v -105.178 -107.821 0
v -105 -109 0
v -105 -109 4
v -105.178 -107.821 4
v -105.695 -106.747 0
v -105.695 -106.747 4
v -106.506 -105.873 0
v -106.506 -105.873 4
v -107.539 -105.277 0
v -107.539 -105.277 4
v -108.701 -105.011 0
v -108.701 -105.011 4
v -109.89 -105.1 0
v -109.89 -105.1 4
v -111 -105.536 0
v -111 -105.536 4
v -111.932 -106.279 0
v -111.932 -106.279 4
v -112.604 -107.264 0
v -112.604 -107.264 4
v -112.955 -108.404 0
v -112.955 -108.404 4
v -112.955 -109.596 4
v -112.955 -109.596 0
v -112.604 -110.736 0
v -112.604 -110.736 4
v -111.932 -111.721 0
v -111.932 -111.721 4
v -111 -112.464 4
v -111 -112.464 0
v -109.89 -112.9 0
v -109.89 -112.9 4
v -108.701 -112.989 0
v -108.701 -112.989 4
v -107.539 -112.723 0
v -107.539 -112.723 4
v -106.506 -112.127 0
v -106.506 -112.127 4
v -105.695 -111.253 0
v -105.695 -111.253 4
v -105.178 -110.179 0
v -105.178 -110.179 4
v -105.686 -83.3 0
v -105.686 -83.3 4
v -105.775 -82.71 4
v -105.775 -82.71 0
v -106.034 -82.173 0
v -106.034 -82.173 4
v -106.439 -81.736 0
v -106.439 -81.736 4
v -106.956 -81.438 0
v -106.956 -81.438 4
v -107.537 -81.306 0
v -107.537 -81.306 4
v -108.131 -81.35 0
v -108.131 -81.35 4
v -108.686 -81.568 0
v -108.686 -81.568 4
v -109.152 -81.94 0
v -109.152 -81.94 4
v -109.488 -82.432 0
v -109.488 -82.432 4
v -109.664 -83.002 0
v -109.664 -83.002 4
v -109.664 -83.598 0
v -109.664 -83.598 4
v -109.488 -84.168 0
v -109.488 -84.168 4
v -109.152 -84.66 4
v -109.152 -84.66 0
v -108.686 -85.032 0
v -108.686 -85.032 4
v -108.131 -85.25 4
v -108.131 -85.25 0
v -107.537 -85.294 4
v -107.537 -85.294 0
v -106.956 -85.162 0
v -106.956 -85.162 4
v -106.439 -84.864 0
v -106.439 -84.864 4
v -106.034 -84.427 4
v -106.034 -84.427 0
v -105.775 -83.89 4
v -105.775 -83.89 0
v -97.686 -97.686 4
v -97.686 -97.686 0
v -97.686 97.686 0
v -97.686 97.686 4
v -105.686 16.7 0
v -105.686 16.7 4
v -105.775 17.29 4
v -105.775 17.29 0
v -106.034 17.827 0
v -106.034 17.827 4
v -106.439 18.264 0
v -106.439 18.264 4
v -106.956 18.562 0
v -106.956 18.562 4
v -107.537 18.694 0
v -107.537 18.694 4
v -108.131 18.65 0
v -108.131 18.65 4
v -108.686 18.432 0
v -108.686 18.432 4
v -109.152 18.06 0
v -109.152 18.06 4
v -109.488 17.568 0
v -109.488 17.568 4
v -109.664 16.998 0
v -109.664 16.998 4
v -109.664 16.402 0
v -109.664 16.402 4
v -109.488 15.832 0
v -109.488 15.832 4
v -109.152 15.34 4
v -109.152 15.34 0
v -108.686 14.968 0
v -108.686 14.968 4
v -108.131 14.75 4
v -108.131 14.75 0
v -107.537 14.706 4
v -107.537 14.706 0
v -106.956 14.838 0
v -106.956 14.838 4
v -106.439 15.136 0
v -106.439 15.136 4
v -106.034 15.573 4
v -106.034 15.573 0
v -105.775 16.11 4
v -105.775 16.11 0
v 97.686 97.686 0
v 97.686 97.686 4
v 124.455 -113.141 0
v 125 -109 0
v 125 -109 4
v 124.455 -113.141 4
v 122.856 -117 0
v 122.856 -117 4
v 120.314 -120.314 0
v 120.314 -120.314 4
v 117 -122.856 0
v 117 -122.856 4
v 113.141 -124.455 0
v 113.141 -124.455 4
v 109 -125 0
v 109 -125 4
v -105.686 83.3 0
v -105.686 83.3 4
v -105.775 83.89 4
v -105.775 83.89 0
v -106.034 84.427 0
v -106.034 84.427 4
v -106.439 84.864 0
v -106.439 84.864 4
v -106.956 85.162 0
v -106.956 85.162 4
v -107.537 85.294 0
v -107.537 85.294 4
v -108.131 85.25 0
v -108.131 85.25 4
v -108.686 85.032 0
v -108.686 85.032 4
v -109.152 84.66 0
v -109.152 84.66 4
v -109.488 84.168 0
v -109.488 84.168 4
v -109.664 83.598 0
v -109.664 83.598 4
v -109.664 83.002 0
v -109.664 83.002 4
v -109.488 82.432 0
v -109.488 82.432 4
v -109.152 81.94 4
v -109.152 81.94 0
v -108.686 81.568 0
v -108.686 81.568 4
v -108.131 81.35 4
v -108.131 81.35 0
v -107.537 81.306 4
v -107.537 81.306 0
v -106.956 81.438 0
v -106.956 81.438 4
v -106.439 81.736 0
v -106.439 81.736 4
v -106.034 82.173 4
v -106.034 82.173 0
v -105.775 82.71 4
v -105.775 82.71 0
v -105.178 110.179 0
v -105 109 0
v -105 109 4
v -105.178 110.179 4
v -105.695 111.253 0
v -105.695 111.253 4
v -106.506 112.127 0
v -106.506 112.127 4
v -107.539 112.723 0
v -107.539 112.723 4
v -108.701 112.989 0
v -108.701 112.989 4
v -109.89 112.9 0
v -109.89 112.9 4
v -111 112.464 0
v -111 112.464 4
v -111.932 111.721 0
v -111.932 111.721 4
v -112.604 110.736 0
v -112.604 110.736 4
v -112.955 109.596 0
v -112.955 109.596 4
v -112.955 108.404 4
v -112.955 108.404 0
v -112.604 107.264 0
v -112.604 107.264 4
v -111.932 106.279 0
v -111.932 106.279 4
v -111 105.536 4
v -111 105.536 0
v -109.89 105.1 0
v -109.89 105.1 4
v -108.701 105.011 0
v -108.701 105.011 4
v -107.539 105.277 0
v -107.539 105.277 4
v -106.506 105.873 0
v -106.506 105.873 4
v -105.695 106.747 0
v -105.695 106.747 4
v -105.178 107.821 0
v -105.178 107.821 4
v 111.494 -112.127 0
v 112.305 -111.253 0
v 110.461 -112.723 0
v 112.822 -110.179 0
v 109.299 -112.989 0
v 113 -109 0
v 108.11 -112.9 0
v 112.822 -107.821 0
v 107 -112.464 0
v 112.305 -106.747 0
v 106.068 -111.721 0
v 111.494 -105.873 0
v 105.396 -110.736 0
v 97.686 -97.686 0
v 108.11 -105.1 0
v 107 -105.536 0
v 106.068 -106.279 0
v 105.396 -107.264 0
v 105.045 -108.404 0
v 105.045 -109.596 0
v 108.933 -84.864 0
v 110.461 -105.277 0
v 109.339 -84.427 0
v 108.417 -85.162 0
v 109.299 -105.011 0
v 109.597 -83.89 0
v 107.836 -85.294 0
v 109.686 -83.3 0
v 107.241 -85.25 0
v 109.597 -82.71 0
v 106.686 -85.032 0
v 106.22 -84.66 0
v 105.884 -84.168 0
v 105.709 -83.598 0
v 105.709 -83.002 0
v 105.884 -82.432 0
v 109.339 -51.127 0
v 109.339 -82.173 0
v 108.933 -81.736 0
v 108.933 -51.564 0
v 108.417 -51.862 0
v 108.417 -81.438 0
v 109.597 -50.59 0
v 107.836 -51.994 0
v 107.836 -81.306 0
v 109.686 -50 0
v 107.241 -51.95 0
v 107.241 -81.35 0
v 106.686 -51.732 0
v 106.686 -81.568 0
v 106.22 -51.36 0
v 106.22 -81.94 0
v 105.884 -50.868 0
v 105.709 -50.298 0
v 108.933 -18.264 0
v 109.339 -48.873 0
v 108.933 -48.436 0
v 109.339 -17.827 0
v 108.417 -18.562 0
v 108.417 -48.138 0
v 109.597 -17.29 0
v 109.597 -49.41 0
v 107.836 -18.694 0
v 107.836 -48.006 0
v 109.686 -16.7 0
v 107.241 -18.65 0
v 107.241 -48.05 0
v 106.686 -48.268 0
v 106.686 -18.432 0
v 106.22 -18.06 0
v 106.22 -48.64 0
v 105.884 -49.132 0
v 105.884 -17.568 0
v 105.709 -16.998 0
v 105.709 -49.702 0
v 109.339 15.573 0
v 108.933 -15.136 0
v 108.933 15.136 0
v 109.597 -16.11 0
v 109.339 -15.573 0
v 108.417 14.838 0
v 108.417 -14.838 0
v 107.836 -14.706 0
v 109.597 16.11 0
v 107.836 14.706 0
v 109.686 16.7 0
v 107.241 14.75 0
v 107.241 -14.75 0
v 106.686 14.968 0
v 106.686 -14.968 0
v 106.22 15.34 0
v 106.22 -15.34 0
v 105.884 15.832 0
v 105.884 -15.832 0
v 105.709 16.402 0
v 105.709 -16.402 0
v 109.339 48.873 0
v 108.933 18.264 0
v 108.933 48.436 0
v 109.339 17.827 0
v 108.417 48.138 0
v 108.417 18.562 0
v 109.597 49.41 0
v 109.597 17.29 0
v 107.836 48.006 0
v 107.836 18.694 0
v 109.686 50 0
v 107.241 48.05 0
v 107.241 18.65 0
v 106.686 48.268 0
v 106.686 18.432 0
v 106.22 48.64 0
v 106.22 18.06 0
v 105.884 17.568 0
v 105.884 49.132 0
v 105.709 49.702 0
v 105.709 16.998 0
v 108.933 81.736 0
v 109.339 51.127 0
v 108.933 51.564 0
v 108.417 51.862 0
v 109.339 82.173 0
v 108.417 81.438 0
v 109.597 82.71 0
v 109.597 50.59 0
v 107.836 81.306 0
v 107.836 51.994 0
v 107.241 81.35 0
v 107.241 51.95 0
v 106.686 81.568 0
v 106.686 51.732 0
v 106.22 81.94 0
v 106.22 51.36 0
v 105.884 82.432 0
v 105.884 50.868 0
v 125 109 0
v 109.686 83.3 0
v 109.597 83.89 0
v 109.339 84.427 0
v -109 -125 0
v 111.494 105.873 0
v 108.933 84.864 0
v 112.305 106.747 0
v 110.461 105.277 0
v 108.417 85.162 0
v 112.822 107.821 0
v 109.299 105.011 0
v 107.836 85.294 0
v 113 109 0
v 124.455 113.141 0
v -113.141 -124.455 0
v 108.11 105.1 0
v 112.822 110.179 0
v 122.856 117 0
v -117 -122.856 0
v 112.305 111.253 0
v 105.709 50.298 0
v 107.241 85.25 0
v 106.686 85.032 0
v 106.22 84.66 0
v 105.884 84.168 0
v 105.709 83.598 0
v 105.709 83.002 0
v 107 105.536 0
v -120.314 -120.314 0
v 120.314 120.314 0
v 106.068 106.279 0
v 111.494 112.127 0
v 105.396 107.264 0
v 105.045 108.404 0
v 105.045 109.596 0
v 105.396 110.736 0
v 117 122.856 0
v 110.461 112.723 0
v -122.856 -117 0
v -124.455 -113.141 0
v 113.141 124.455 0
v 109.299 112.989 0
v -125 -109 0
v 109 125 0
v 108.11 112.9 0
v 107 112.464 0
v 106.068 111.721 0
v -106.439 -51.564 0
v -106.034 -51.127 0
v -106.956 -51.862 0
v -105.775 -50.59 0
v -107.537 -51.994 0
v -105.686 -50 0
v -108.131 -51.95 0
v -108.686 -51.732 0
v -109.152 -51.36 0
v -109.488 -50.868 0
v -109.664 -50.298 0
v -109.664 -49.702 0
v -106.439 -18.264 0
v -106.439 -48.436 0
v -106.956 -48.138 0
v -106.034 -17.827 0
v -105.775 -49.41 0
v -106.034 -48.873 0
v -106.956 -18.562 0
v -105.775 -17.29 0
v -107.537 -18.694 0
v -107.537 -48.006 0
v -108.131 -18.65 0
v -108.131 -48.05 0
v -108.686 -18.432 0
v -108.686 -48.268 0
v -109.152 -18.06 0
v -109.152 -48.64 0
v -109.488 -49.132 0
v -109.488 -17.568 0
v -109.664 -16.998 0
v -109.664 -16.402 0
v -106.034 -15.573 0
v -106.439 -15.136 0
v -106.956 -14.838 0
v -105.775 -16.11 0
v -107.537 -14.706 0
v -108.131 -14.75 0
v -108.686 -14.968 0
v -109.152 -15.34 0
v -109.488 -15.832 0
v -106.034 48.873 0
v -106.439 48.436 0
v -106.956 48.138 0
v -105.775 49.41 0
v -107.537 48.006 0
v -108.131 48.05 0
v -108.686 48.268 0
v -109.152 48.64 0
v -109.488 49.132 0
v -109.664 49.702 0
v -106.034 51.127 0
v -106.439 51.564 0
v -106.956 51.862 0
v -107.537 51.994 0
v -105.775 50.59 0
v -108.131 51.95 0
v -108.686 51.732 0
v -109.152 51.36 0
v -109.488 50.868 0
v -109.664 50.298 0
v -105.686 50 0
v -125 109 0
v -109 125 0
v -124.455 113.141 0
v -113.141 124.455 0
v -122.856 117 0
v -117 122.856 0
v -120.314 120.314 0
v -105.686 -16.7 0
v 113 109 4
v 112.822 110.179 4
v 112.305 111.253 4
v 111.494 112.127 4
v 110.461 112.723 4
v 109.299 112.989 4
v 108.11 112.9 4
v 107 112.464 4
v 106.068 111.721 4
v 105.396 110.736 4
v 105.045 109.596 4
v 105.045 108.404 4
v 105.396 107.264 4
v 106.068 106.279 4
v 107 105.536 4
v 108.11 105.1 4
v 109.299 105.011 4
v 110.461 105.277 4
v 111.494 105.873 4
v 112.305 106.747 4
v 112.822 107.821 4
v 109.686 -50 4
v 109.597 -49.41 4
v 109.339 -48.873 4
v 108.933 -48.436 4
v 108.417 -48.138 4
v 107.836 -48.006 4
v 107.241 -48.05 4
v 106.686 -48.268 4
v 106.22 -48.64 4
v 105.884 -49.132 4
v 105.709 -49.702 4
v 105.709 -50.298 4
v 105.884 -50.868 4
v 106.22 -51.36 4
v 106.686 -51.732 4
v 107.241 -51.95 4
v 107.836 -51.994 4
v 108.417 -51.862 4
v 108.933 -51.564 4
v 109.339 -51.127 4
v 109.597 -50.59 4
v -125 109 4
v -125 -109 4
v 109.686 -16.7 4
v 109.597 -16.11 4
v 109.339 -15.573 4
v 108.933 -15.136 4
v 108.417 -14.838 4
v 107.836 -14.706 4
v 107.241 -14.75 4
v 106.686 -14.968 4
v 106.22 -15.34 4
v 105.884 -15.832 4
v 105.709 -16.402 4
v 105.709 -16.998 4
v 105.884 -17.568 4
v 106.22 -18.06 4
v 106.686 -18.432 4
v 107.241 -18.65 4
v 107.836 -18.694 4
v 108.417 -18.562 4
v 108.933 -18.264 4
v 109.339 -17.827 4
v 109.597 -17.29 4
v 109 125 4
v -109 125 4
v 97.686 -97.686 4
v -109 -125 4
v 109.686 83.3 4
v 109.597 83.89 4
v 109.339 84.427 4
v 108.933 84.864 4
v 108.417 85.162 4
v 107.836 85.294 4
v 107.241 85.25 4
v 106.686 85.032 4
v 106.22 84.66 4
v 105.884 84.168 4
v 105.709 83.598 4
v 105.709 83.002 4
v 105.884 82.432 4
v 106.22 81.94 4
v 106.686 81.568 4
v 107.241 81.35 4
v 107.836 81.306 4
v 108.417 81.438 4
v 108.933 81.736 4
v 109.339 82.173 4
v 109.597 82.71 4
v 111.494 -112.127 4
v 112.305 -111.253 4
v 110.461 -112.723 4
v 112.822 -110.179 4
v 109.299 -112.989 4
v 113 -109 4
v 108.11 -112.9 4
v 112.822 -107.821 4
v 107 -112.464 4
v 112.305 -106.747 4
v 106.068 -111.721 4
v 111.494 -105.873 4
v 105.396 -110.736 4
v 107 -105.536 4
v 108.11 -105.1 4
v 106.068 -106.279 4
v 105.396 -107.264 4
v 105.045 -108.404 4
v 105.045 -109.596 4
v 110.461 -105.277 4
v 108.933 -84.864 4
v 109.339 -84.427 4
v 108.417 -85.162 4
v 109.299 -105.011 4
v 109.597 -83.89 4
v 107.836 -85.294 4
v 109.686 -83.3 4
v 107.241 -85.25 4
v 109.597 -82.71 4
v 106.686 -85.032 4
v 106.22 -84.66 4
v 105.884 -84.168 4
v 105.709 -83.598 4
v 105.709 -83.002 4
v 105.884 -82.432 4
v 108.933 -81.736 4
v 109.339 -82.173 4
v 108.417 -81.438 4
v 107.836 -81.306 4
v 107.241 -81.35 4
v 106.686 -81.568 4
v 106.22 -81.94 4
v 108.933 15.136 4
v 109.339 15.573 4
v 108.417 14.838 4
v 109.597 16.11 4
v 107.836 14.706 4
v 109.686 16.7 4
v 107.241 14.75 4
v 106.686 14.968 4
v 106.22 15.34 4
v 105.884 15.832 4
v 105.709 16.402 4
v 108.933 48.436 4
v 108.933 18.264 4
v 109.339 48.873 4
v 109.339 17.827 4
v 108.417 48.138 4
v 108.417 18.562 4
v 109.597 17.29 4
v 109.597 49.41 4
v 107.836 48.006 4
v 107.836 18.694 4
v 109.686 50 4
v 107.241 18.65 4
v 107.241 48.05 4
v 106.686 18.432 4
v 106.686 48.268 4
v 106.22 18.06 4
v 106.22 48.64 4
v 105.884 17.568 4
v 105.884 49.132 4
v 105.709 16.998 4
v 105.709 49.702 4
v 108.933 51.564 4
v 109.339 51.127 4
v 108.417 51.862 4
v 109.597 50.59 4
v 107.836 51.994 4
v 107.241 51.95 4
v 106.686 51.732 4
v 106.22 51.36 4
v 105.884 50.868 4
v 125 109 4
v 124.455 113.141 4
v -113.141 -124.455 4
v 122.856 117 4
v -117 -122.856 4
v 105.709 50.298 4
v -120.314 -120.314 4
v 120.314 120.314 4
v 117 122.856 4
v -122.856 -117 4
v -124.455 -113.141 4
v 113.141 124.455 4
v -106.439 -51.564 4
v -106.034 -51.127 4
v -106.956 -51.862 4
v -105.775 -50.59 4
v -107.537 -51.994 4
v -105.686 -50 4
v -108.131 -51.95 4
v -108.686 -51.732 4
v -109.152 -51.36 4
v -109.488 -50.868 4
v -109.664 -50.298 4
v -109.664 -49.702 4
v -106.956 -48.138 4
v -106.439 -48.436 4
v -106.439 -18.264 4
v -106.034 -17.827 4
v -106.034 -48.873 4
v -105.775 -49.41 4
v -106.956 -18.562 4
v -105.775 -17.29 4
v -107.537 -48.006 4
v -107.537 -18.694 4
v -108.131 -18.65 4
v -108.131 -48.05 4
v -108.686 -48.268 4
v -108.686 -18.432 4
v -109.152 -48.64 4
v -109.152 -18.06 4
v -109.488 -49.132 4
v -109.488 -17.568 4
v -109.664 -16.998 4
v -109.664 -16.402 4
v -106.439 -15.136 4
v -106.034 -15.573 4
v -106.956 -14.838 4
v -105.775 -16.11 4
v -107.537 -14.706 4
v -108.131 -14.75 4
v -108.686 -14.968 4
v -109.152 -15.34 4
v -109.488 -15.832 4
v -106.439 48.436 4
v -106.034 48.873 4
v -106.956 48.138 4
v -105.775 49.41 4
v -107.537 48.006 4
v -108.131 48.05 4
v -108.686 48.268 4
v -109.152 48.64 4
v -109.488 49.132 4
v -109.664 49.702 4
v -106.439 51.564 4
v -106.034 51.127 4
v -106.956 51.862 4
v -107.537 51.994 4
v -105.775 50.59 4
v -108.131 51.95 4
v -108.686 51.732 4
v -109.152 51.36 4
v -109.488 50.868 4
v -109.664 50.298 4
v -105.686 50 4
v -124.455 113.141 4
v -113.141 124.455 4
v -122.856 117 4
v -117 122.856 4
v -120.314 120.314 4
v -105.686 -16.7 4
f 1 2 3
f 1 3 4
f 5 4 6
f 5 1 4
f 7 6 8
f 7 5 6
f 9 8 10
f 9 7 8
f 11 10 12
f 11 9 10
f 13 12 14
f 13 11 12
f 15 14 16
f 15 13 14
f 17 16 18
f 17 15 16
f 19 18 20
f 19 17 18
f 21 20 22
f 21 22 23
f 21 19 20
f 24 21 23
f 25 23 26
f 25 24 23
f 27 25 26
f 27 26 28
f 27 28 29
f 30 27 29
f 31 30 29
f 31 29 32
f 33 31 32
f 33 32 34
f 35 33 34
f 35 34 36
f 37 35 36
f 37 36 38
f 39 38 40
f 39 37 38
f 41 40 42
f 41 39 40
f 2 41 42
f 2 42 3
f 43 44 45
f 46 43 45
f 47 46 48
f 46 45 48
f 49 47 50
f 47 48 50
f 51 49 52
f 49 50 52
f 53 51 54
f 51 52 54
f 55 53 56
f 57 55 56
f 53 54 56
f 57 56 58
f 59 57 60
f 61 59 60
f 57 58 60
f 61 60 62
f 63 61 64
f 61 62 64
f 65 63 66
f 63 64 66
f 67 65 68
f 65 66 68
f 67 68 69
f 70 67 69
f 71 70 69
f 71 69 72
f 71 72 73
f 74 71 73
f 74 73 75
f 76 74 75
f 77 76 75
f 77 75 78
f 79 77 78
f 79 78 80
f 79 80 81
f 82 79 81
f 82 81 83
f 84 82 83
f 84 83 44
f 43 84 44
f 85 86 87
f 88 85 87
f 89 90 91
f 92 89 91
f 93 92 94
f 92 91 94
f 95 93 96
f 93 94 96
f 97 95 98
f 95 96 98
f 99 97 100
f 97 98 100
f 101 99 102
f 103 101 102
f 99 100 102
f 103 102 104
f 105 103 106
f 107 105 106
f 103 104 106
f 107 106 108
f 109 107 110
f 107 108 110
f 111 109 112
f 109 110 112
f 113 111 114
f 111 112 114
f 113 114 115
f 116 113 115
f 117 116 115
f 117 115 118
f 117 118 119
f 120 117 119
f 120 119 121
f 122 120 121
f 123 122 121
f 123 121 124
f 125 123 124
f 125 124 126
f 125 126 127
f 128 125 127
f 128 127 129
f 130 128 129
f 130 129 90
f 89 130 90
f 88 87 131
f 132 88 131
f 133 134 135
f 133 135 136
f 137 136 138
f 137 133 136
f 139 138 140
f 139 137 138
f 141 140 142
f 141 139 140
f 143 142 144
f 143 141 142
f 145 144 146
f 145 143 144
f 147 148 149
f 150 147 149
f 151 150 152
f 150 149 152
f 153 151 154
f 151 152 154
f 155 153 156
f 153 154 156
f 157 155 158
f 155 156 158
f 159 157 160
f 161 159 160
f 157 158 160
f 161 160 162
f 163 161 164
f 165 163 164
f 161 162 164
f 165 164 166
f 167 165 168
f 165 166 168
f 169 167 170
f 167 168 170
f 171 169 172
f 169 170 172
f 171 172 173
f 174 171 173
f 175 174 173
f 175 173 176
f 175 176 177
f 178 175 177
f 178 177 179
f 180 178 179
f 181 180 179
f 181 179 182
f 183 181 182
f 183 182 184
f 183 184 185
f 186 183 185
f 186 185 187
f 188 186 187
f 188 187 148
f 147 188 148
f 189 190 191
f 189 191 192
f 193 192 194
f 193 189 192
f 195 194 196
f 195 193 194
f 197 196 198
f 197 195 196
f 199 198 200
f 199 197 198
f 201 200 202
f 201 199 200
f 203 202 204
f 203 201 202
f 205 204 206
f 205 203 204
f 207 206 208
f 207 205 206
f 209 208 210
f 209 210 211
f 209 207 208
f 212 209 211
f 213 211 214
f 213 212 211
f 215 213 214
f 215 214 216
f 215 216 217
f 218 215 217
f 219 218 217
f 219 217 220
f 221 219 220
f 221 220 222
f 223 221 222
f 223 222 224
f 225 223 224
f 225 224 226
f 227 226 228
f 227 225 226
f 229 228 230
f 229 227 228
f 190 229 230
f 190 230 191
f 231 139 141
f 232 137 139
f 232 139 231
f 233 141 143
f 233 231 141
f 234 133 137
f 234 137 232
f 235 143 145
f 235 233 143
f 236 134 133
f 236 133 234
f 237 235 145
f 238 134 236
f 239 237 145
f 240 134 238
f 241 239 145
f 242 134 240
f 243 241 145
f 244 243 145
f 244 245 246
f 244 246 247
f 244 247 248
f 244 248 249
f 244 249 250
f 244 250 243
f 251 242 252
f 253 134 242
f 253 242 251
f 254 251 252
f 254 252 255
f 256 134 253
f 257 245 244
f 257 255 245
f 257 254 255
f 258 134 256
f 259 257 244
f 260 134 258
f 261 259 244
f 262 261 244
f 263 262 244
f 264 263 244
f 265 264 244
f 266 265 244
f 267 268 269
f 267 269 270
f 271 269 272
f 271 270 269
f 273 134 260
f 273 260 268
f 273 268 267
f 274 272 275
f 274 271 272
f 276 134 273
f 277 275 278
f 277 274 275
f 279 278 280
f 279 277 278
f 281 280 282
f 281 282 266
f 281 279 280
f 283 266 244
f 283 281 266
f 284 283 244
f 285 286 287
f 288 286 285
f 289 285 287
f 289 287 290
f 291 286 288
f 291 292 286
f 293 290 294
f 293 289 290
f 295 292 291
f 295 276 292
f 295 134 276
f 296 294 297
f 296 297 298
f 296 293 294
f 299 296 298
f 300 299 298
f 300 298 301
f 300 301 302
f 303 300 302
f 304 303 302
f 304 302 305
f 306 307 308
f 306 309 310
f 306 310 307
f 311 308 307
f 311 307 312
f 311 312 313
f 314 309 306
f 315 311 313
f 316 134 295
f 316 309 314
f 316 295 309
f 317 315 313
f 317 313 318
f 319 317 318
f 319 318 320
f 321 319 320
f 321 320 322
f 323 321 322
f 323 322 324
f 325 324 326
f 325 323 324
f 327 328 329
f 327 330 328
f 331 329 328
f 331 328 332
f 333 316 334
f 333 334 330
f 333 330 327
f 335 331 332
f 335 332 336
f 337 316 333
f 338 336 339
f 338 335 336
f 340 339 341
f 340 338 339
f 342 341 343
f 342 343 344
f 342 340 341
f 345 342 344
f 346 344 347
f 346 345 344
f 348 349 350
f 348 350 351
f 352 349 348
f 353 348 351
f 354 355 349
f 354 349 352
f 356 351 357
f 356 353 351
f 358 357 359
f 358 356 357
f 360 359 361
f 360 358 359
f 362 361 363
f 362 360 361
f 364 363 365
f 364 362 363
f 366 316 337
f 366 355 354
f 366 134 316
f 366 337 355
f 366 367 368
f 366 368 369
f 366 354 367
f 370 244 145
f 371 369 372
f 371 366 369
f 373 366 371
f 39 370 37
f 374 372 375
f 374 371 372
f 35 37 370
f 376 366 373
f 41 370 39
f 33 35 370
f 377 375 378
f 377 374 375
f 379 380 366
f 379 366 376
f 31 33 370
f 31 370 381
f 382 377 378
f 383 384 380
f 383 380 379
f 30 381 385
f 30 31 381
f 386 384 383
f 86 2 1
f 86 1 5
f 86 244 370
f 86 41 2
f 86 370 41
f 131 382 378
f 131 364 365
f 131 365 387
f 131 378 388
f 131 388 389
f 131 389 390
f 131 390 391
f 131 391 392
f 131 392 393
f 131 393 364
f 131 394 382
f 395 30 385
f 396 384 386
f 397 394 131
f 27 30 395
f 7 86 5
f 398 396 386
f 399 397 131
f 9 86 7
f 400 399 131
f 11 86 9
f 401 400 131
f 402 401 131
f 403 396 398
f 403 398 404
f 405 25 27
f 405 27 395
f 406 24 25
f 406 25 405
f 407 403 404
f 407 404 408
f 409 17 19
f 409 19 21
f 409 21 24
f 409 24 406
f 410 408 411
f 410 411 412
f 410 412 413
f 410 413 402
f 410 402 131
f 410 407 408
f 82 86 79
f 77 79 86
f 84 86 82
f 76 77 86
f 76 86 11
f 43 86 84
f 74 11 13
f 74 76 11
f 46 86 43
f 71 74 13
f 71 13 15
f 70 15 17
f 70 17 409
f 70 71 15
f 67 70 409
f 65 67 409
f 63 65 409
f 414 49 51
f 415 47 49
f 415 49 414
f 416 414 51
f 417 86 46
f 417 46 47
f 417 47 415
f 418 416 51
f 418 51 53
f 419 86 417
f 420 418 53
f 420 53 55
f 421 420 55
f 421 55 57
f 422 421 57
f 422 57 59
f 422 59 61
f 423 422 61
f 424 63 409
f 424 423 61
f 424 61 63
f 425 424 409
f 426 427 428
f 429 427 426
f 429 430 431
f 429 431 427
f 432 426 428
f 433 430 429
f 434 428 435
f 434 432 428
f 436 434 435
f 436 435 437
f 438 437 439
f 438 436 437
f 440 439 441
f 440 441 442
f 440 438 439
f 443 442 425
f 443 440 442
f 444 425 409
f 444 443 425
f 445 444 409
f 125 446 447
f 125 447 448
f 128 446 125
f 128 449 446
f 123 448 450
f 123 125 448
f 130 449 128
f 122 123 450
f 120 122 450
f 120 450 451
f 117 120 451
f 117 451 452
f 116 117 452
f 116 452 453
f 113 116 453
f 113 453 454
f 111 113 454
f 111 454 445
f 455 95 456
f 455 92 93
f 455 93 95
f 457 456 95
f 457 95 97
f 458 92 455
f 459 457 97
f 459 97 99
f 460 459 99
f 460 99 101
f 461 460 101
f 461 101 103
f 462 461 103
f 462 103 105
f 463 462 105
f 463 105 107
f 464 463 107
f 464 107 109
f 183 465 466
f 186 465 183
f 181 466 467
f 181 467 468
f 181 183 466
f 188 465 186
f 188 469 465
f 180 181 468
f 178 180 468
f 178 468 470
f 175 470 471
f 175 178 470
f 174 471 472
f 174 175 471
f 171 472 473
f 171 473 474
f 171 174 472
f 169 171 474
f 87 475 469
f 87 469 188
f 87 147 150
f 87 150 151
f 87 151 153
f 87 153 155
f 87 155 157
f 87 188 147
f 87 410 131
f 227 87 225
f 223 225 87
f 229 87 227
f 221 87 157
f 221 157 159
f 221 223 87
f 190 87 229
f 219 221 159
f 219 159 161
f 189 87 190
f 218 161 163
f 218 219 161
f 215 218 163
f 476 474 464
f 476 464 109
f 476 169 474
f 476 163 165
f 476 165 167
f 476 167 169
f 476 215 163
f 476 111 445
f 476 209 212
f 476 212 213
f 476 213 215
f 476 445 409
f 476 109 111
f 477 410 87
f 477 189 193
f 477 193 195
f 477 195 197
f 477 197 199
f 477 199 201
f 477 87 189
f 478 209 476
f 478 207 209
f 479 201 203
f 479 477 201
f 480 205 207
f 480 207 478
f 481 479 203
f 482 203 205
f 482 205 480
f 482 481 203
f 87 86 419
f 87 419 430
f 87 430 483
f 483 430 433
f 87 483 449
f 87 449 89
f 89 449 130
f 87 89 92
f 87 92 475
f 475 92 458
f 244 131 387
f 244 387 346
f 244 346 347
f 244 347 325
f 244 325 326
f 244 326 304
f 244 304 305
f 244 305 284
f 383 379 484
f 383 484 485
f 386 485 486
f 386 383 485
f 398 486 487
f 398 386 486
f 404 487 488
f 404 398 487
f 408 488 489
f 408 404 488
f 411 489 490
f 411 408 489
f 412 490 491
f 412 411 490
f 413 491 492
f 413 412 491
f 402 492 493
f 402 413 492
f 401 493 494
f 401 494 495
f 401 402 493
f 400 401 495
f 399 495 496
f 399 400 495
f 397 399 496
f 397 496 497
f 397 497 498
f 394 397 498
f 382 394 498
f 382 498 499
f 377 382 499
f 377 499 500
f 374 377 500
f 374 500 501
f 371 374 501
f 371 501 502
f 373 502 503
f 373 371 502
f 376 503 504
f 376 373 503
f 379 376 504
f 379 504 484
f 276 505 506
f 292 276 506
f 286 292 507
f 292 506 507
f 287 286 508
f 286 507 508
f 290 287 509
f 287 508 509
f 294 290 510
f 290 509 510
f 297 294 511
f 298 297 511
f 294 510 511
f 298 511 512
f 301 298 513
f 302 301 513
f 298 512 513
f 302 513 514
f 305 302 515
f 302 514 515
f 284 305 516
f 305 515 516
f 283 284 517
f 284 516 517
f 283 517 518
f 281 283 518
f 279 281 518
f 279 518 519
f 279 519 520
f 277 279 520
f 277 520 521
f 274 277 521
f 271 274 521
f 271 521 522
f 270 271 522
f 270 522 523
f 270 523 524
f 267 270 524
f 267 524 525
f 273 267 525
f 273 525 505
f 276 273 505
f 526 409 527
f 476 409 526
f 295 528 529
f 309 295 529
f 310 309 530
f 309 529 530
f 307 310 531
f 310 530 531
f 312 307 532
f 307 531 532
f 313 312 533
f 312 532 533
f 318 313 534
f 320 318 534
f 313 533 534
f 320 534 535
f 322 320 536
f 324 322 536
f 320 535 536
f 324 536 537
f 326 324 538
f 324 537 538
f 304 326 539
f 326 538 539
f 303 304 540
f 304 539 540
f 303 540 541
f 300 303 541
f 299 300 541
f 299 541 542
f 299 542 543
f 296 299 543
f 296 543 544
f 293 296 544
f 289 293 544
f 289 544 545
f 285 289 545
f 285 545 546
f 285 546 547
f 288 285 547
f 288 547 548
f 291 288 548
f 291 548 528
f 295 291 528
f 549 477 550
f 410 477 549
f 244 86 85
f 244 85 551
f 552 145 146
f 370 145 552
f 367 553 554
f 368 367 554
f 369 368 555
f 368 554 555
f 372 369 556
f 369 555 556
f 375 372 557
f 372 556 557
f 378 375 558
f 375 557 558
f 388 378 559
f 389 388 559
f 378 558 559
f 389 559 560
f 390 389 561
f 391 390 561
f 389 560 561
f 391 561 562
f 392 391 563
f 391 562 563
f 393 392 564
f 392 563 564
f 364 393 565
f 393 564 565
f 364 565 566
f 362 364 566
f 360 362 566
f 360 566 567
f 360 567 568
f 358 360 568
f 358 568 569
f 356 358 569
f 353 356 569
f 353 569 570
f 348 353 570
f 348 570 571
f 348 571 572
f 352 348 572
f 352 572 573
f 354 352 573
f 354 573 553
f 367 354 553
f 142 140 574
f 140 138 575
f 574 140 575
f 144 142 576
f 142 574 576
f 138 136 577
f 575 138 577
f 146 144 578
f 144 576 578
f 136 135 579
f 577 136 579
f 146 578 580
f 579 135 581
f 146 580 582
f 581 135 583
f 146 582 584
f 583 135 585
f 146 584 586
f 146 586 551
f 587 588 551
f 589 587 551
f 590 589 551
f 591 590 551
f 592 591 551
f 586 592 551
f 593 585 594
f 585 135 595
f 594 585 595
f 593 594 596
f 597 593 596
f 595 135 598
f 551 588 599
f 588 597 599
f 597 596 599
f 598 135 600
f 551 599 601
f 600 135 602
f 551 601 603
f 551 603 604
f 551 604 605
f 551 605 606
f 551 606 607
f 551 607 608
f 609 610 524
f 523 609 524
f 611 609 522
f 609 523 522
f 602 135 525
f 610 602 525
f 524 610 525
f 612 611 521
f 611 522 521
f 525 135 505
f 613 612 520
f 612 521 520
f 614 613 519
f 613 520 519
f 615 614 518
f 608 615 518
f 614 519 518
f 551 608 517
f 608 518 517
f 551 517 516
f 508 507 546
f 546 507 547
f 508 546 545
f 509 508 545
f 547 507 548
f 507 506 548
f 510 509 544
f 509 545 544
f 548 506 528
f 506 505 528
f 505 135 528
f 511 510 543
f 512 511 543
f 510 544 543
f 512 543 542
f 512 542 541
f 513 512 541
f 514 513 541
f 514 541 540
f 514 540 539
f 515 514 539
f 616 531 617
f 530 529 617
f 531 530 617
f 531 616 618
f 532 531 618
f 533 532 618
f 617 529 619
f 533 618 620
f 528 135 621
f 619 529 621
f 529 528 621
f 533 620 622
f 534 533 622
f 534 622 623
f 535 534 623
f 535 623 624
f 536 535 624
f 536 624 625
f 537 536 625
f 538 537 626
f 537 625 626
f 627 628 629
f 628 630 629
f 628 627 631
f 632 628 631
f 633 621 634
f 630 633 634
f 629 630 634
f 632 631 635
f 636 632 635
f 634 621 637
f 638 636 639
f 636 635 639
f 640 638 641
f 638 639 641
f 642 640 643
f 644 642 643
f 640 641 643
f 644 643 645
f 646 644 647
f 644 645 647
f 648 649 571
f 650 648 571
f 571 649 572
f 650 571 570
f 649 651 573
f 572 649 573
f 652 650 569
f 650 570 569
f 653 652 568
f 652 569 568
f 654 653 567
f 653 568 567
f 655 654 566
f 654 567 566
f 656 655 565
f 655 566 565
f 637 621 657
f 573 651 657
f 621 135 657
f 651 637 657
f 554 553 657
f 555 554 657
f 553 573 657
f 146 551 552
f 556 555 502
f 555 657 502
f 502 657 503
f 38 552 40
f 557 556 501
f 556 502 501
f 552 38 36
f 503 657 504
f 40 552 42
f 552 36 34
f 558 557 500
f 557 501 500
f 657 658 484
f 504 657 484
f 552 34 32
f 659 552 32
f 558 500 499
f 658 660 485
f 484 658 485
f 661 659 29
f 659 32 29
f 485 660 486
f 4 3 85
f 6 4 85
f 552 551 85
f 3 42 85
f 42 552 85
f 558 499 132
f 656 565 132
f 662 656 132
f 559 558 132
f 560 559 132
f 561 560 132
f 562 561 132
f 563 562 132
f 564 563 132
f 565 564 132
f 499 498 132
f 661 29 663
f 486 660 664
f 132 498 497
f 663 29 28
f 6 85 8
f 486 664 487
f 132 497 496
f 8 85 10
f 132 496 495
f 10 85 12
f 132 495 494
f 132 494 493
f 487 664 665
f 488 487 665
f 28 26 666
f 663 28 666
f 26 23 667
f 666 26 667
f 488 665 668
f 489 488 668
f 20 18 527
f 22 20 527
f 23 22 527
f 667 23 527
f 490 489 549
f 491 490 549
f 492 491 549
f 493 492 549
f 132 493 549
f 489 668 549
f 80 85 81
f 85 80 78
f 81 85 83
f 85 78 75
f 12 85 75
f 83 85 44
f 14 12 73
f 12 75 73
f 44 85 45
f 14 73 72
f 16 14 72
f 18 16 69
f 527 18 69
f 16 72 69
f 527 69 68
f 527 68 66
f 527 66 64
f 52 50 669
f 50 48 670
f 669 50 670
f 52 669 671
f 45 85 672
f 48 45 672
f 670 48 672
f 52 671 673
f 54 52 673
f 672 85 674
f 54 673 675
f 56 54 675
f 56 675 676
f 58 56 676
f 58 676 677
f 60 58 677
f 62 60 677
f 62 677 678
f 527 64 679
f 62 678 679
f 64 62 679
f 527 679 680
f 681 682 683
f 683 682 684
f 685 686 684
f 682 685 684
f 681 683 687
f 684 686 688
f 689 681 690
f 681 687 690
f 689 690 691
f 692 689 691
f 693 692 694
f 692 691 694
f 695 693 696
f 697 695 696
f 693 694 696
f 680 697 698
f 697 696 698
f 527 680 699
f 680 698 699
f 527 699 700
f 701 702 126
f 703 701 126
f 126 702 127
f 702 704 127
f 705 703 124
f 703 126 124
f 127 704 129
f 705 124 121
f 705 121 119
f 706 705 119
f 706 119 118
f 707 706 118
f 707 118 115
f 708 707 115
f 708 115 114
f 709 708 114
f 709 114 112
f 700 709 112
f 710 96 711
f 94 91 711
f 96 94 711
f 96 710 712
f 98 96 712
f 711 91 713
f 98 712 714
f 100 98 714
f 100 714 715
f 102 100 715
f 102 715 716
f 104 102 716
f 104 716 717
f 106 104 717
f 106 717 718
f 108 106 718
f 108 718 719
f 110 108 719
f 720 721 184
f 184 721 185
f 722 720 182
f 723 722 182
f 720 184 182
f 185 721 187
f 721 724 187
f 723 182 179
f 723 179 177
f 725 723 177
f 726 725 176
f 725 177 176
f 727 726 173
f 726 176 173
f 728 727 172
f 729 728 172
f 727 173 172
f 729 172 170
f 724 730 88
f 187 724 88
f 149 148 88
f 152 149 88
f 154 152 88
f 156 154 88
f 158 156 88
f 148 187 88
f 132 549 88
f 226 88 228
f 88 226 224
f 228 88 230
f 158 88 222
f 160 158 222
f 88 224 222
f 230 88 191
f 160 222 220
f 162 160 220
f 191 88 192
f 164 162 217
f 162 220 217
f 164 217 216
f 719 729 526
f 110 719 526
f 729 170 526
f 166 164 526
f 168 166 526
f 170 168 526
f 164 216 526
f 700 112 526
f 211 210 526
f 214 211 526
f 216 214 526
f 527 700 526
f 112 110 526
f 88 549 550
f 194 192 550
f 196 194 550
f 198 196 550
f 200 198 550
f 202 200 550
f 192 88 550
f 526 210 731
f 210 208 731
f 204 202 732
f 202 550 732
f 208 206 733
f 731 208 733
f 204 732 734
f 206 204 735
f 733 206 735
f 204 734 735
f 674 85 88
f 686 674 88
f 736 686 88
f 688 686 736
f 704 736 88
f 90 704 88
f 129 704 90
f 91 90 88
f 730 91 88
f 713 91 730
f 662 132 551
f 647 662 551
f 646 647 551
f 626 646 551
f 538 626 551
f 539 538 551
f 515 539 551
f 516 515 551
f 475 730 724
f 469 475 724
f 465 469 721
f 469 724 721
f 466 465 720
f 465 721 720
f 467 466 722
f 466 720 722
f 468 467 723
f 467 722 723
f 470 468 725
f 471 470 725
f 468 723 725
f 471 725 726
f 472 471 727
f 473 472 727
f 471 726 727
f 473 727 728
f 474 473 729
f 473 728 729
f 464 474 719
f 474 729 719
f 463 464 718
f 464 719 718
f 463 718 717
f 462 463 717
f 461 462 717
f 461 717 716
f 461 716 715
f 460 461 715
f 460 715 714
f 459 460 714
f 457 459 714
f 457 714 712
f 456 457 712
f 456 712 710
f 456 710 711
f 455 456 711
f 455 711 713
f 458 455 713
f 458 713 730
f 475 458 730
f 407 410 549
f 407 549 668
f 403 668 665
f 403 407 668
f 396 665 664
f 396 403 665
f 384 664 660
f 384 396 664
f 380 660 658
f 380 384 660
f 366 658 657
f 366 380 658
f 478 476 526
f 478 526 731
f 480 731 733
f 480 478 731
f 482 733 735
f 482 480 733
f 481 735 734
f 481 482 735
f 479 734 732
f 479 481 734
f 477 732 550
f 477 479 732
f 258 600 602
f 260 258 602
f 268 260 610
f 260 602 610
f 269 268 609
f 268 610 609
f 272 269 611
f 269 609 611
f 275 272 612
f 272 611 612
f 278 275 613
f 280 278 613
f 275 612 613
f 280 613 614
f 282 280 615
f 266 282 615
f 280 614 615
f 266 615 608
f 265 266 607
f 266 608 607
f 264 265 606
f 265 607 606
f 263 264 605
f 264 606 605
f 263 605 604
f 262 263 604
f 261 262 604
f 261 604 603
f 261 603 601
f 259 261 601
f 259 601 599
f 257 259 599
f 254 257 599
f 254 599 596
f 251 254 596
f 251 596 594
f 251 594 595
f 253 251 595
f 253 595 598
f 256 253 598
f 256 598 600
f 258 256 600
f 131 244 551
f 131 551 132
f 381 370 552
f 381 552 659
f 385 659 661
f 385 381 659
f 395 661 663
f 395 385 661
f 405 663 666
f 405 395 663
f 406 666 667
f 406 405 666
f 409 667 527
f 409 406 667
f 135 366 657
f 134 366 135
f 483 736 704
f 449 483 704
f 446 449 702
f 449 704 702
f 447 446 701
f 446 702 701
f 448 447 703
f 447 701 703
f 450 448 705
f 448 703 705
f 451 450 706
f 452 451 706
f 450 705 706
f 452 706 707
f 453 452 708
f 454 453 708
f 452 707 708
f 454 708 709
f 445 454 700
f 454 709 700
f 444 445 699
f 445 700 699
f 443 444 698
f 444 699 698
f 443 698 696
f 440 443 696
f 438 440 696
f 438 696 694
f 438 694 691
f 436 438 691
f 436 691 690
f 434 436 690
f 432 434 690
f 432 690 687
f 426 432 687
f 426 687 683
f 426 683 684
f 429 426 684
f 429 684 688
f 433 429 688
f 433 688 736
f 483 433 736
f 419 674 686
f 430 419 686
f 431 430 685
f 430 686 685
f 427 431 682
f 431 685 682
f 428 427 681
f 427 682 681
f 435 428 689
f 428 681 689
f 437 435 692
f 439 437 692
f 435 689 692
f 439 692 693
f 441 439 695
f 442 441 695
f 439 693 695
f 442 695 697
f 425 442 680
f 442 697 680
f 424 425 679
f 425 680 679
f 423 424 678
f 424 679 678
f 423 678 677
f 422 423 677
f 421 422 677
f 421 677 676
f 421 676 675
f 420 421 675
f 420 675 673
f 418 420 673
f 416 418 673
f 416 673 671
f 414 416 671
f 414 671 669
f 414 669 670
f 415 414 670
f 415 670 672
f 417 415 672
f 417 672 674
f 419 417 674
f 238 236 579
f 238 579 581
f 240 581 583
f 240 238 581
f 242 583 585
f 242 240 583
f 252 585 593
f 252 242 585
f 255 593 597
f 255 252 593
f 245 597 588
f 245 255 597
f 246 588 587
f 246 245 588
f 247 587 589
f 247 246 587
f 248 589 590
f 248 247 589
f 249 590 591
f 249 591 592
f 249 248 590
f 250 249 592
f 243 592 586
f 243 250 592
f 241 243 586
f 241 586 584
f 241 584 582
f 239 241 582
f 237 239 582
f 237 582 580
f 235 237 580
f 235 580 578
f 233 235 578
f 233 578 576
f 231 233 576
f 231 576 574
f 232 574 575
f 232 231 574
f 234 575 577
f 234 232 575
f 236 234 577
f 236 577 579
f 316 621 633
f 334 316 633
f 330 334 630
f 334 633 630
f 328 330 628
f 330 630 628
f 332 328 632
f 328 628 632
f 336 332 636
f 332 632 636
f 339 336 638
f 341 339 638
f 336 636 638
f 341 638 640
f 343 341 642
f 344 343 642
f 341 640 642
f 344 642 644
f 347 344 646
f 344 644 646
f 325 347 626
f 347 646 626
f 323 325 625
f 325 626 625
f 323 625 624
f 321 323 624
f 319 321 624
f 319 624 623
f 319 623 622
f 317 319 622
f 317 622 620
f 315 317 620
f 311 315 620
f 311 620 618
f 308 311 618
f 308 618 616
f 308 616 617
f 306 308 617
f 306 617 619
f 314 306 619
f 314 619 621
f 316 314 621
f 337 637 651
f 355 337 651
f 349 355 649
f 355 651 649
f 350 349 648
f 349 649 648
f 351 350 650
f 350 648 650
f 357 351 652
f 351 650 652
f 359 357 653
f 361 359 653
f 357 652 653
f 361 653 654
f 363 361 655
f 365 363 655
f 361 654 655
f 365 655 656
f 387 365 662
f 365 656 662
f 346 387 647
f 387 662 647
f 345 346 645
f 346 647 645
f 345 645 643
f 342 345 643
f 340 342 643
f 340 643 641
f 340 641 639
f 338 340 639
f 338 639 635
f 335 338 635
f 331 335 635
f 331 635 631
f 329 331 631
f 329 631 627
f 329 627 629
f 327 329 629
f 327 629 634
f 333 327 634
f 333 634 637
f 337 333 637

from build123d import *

# Parameters (mm, degrees)
SKETCH1_R           = 4
SKETCH1_W           = 195.372583002
SKETCH1_H           = 195.372583002
BOSS_EXTRUDE1_DEPTH = 4
SKETCH2_R           = 2
CUT_EXTRUDE1_DEPTH  = 10


with BuildPart() as part:
    # Sketch1 → Boss-Extrude1 (new body)
    with BuildSketch(Plane.XY):
        with BuildLine():
            Line((-109, 125), (109, 125))
            ThreePointArc((109, 125), (120.313708499, 120.313708499), (125, 109))
            Line((125, 109), (125, -109))
            ThreePointArc((125, -109), (120.313708499, -120.313708499), (109, -125))
            Line((109, -125), (-109, -125))
            ThreePointArc((-109, -125), (-120.313708499, -120.313708499), (-125, -109))
            Line((-125, -109), (-125, 109))
            ThreePointArc((-125, 109), (-120.313708499, 120.313708499), (-109, 125))
        make_face()
        with Locations((-109, 109)):
            Circle(SKETCH1_R, mode=Mode.SUBTRACT)
        with Locations((109, 109)):
            Circle(SKETCH1_R, mode=Mode.SUBTRACT)
        with Locations((109, -109)):
            Circle(SKETCH1_R, mode=Mode.SUBTRACT)
        with Locations((-109, -109)):
            Circle(SKETCH1_R, mode=Mode.SUBTRACT)
        Rectangle(SKETCH1_W, SKETCH1_H, mode=Mode.SUBTRACT)
    extrude(amount=BOSS_EXTRUDE1_DEPTH)

    # Sketch2 → Cut-Extrude1 (cut)
    with BuildSketch(Plane.XY.offset(4)):
        with Locations((-107.686291501, 83.3)):
            Circle(SKETCH2_R)
        with Locations((-107.686291501, 50)):
            Circle(SKETCH2_R)
        with Locations((-107.686291501, 16.7)):
            Circle(SKETCH2_R)
        with Locations((-107.686291501, -16.7)):
            Circle(SKETCH2_R)
        with Locations((-107.686291501, -50)):
            Circle(SKETCH2_R)
        with Locations((-107.686291501, -83.3)):
            Circle(SKETCH2_R)
        with Locations((107.686291501, -83.3)):
            Circle(SKETCH2_R)
        with Locations((107.686291501, -50)):
            Circle(SKETCH2_R)
        with Locations((107.686291501, -16.7)):
            Circle(SKETCH2_R)
        with Locations((107.686291501, 16.7)):
            Circle(SKETCH2_R)
        with Locations((107.686291501, 50)):
            Circle(SKETCH2_R)
        with Locations((107.686291501, 83.3)):
            Circle(SKETCH2_R)
    extrude(amount=-CUT_EXTRUDE1_DEPTH, mode=Mode.SUBTRACT)


solid = part.part
